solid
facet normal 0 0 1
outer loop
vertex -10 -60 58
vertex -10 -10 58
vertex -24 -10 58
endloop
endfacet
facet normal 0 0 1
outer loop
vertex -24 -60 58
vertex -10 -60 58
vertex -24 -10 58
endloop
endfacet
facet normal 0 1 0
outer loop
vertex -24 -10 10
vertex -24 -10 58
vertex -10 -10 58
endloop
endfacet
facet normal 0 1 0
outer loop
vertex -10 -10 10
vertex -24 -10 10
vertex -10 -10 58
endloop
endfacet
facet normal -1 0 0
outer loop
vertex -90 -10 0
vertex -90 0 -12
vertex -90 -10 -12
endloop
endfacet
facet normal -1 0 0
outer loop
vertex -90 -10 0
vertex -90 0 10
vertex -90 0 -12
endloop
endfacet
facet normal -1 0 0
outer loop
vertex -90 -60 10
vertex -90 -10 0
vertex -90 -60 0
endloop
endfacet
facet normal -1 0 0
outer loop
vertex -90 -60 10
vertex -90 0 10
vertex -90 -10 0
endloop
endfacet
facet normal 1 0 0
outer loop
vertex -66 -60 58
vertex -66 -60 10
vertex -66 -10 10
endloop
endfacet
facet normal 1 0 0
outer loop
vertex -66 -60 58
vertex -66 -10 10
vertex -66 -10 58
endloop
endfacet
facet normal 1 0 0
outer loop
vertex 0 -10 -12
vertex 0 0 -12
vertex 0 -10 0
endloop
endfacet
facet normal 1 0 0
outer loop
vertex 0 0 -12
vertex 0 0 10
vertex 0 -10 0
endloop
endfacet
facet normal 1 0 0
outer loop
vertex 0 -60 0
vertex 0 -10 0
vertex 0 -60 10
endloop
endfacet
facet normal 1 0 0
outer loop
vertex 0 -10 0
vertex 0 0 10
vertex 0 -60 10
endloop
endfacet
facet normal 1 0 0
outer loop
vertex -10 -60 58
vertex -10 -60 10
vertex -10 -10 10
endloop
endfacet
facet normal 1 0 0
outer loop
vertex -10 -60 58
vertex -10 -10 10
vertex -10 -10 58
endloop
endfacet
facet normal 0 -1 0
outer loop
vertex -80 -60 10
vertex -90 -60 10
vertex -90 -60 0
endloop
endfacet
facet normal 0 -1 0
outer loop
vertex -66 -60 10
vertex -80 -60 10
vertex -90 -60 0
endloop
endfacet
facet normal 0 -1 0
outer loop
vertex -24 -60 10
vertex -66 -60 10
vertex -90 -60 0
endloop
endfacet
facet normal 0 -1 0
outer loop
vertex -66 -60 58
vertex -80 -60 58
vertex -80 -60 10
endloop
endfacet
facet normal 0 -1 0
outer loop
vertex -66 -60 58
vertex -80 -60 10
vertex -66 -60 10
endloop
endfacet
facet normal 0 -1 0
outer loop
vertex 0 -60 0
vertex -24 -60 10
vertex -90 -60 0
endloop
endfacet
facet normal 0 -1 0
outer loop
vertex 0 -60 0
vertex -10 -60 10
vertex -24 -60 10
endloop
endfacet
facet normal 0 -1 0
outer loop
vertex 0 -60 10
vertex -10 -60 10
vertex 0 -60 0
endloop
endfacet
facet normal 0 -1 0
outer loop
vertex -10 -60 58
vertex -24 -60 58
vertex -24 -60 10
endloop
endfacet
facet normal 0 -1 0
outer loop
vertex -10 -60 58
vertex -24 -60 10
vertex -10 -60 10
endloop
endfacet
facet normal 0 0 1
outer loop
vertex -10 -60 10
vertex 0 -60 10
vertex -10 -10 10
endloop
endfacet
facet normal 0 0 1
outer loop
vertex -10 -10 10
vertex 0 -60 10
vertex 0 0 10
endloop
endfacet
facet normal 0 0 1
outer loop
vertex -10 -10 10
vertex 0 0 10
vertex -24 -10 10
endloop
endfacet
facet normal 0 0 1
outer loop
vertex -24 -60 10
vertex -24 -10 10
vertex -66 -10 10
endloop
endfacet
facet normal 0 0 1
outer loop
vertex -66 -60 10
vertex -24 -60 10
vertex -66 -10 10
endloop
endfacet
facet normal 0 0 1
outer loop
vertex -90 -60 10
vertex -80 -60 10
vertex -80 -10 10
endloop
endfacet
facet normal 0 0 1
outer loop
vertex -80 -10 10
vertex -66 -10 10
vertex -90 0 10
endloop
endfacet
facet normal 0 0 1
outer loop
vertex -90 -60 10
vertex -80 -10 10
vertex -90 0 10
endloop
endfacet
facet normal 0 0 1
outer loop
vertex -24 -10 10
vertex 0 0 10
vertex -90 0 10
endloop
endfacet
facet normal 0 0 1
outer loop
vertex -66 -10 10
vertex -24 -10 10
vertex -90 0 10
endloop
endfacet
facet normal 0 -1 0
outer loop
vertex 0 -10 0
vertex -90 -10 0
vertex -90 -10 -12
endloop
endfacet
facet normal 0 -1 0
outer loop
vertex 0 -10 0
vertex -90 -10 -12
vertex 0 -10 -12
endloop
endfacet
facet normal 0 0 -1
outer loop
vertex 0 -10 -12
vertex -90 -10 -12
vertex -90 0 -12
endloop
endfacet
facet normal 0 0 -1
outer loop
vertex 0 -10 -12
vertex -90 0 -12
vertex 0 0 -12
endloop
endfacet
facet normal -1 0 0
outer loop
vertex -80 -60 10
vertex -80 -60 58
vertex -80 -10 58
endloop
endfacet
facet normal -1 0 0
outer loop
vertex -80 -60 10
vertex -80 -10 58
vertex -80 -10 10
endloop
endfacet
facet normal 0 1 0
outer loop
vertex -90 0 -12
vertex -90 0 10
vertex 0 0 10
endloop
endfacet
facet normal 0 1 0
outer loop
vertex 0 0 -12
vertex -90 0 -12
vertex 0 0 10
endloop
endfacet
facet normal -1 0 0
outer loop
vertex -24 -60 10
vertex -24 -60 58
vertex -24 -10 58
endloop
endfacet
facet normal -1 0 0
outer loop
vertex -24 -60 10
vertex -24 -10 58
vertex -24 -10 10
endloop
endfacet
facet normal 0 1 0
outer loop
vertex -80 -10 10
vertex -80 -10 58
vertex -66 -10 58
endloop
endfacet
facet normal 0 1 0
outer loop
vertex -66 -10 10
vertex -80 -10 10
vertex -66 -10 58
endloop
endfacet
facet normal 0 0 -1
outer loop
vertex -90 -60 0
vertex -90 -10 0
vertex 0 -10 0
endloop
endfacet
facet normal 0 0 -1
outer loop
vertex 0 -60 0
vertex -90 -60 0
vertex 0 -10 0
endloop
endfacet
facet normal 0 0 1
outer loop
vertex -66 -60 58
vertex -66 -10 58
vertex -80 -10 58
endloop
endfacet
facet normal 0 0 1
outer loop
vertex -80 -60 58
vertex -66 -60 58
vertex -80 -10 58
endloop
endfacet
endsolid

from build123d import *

# Parameters (mm, degrees)
F1_DEPTH = 60
F2_W     = 90
F2_H     = 10
F3_DEPTH = 12
F4_W     = 14
F4_H     = 10
F5_DEPTH = 48
F6_W     = 14
F6_H     = 10
F7_DEPTH = 48


with BuildPart() as f1:
    # F0 (on Front) → F1 (new body)
    with BuildSketch(Plane.XZ):
        Polygon((-90, 0), (0, 0), (0, 10), (-10, 10), (-10, 58), (-24, 58), (-24, 10), (-66, 10), (-66, 58), (-80, 58), (-80, 10), (-90, 10), align=None)
    extrude(amount=F1_DEPTH)

    # F2 (on face) → F3 (join)
    with BuildSketch(Plane(origin=(0, 0, 0), x_dir=(1, 0, 0), z_dir=(0, 0, -1))):
        with Locations((-45, 5)):
            Rectangle(F2_W, F2_H)
    extrude(amount=F3_DEPTH)

    # F4 (on face) → F5 (cut)
    with BuildSketch(Plane.XY.offset(58)):
        with Locations((-17, -5)):
            Rectangle(F4_W, F4_H)
    extrude(amount=-F5_DEPTH, mode=Mode.SUBTRACT)

    # F6 (on face) → F7 (cut)
    with BuildSketch(Plane.XY.offset(58)):
        with Locations((-73, -5)):
            Rectangle(F6_W, F6_H)
    extrude(amount=-F7_DEPTH, mode=Mode.SUBTRACT)


solid = f1.part
